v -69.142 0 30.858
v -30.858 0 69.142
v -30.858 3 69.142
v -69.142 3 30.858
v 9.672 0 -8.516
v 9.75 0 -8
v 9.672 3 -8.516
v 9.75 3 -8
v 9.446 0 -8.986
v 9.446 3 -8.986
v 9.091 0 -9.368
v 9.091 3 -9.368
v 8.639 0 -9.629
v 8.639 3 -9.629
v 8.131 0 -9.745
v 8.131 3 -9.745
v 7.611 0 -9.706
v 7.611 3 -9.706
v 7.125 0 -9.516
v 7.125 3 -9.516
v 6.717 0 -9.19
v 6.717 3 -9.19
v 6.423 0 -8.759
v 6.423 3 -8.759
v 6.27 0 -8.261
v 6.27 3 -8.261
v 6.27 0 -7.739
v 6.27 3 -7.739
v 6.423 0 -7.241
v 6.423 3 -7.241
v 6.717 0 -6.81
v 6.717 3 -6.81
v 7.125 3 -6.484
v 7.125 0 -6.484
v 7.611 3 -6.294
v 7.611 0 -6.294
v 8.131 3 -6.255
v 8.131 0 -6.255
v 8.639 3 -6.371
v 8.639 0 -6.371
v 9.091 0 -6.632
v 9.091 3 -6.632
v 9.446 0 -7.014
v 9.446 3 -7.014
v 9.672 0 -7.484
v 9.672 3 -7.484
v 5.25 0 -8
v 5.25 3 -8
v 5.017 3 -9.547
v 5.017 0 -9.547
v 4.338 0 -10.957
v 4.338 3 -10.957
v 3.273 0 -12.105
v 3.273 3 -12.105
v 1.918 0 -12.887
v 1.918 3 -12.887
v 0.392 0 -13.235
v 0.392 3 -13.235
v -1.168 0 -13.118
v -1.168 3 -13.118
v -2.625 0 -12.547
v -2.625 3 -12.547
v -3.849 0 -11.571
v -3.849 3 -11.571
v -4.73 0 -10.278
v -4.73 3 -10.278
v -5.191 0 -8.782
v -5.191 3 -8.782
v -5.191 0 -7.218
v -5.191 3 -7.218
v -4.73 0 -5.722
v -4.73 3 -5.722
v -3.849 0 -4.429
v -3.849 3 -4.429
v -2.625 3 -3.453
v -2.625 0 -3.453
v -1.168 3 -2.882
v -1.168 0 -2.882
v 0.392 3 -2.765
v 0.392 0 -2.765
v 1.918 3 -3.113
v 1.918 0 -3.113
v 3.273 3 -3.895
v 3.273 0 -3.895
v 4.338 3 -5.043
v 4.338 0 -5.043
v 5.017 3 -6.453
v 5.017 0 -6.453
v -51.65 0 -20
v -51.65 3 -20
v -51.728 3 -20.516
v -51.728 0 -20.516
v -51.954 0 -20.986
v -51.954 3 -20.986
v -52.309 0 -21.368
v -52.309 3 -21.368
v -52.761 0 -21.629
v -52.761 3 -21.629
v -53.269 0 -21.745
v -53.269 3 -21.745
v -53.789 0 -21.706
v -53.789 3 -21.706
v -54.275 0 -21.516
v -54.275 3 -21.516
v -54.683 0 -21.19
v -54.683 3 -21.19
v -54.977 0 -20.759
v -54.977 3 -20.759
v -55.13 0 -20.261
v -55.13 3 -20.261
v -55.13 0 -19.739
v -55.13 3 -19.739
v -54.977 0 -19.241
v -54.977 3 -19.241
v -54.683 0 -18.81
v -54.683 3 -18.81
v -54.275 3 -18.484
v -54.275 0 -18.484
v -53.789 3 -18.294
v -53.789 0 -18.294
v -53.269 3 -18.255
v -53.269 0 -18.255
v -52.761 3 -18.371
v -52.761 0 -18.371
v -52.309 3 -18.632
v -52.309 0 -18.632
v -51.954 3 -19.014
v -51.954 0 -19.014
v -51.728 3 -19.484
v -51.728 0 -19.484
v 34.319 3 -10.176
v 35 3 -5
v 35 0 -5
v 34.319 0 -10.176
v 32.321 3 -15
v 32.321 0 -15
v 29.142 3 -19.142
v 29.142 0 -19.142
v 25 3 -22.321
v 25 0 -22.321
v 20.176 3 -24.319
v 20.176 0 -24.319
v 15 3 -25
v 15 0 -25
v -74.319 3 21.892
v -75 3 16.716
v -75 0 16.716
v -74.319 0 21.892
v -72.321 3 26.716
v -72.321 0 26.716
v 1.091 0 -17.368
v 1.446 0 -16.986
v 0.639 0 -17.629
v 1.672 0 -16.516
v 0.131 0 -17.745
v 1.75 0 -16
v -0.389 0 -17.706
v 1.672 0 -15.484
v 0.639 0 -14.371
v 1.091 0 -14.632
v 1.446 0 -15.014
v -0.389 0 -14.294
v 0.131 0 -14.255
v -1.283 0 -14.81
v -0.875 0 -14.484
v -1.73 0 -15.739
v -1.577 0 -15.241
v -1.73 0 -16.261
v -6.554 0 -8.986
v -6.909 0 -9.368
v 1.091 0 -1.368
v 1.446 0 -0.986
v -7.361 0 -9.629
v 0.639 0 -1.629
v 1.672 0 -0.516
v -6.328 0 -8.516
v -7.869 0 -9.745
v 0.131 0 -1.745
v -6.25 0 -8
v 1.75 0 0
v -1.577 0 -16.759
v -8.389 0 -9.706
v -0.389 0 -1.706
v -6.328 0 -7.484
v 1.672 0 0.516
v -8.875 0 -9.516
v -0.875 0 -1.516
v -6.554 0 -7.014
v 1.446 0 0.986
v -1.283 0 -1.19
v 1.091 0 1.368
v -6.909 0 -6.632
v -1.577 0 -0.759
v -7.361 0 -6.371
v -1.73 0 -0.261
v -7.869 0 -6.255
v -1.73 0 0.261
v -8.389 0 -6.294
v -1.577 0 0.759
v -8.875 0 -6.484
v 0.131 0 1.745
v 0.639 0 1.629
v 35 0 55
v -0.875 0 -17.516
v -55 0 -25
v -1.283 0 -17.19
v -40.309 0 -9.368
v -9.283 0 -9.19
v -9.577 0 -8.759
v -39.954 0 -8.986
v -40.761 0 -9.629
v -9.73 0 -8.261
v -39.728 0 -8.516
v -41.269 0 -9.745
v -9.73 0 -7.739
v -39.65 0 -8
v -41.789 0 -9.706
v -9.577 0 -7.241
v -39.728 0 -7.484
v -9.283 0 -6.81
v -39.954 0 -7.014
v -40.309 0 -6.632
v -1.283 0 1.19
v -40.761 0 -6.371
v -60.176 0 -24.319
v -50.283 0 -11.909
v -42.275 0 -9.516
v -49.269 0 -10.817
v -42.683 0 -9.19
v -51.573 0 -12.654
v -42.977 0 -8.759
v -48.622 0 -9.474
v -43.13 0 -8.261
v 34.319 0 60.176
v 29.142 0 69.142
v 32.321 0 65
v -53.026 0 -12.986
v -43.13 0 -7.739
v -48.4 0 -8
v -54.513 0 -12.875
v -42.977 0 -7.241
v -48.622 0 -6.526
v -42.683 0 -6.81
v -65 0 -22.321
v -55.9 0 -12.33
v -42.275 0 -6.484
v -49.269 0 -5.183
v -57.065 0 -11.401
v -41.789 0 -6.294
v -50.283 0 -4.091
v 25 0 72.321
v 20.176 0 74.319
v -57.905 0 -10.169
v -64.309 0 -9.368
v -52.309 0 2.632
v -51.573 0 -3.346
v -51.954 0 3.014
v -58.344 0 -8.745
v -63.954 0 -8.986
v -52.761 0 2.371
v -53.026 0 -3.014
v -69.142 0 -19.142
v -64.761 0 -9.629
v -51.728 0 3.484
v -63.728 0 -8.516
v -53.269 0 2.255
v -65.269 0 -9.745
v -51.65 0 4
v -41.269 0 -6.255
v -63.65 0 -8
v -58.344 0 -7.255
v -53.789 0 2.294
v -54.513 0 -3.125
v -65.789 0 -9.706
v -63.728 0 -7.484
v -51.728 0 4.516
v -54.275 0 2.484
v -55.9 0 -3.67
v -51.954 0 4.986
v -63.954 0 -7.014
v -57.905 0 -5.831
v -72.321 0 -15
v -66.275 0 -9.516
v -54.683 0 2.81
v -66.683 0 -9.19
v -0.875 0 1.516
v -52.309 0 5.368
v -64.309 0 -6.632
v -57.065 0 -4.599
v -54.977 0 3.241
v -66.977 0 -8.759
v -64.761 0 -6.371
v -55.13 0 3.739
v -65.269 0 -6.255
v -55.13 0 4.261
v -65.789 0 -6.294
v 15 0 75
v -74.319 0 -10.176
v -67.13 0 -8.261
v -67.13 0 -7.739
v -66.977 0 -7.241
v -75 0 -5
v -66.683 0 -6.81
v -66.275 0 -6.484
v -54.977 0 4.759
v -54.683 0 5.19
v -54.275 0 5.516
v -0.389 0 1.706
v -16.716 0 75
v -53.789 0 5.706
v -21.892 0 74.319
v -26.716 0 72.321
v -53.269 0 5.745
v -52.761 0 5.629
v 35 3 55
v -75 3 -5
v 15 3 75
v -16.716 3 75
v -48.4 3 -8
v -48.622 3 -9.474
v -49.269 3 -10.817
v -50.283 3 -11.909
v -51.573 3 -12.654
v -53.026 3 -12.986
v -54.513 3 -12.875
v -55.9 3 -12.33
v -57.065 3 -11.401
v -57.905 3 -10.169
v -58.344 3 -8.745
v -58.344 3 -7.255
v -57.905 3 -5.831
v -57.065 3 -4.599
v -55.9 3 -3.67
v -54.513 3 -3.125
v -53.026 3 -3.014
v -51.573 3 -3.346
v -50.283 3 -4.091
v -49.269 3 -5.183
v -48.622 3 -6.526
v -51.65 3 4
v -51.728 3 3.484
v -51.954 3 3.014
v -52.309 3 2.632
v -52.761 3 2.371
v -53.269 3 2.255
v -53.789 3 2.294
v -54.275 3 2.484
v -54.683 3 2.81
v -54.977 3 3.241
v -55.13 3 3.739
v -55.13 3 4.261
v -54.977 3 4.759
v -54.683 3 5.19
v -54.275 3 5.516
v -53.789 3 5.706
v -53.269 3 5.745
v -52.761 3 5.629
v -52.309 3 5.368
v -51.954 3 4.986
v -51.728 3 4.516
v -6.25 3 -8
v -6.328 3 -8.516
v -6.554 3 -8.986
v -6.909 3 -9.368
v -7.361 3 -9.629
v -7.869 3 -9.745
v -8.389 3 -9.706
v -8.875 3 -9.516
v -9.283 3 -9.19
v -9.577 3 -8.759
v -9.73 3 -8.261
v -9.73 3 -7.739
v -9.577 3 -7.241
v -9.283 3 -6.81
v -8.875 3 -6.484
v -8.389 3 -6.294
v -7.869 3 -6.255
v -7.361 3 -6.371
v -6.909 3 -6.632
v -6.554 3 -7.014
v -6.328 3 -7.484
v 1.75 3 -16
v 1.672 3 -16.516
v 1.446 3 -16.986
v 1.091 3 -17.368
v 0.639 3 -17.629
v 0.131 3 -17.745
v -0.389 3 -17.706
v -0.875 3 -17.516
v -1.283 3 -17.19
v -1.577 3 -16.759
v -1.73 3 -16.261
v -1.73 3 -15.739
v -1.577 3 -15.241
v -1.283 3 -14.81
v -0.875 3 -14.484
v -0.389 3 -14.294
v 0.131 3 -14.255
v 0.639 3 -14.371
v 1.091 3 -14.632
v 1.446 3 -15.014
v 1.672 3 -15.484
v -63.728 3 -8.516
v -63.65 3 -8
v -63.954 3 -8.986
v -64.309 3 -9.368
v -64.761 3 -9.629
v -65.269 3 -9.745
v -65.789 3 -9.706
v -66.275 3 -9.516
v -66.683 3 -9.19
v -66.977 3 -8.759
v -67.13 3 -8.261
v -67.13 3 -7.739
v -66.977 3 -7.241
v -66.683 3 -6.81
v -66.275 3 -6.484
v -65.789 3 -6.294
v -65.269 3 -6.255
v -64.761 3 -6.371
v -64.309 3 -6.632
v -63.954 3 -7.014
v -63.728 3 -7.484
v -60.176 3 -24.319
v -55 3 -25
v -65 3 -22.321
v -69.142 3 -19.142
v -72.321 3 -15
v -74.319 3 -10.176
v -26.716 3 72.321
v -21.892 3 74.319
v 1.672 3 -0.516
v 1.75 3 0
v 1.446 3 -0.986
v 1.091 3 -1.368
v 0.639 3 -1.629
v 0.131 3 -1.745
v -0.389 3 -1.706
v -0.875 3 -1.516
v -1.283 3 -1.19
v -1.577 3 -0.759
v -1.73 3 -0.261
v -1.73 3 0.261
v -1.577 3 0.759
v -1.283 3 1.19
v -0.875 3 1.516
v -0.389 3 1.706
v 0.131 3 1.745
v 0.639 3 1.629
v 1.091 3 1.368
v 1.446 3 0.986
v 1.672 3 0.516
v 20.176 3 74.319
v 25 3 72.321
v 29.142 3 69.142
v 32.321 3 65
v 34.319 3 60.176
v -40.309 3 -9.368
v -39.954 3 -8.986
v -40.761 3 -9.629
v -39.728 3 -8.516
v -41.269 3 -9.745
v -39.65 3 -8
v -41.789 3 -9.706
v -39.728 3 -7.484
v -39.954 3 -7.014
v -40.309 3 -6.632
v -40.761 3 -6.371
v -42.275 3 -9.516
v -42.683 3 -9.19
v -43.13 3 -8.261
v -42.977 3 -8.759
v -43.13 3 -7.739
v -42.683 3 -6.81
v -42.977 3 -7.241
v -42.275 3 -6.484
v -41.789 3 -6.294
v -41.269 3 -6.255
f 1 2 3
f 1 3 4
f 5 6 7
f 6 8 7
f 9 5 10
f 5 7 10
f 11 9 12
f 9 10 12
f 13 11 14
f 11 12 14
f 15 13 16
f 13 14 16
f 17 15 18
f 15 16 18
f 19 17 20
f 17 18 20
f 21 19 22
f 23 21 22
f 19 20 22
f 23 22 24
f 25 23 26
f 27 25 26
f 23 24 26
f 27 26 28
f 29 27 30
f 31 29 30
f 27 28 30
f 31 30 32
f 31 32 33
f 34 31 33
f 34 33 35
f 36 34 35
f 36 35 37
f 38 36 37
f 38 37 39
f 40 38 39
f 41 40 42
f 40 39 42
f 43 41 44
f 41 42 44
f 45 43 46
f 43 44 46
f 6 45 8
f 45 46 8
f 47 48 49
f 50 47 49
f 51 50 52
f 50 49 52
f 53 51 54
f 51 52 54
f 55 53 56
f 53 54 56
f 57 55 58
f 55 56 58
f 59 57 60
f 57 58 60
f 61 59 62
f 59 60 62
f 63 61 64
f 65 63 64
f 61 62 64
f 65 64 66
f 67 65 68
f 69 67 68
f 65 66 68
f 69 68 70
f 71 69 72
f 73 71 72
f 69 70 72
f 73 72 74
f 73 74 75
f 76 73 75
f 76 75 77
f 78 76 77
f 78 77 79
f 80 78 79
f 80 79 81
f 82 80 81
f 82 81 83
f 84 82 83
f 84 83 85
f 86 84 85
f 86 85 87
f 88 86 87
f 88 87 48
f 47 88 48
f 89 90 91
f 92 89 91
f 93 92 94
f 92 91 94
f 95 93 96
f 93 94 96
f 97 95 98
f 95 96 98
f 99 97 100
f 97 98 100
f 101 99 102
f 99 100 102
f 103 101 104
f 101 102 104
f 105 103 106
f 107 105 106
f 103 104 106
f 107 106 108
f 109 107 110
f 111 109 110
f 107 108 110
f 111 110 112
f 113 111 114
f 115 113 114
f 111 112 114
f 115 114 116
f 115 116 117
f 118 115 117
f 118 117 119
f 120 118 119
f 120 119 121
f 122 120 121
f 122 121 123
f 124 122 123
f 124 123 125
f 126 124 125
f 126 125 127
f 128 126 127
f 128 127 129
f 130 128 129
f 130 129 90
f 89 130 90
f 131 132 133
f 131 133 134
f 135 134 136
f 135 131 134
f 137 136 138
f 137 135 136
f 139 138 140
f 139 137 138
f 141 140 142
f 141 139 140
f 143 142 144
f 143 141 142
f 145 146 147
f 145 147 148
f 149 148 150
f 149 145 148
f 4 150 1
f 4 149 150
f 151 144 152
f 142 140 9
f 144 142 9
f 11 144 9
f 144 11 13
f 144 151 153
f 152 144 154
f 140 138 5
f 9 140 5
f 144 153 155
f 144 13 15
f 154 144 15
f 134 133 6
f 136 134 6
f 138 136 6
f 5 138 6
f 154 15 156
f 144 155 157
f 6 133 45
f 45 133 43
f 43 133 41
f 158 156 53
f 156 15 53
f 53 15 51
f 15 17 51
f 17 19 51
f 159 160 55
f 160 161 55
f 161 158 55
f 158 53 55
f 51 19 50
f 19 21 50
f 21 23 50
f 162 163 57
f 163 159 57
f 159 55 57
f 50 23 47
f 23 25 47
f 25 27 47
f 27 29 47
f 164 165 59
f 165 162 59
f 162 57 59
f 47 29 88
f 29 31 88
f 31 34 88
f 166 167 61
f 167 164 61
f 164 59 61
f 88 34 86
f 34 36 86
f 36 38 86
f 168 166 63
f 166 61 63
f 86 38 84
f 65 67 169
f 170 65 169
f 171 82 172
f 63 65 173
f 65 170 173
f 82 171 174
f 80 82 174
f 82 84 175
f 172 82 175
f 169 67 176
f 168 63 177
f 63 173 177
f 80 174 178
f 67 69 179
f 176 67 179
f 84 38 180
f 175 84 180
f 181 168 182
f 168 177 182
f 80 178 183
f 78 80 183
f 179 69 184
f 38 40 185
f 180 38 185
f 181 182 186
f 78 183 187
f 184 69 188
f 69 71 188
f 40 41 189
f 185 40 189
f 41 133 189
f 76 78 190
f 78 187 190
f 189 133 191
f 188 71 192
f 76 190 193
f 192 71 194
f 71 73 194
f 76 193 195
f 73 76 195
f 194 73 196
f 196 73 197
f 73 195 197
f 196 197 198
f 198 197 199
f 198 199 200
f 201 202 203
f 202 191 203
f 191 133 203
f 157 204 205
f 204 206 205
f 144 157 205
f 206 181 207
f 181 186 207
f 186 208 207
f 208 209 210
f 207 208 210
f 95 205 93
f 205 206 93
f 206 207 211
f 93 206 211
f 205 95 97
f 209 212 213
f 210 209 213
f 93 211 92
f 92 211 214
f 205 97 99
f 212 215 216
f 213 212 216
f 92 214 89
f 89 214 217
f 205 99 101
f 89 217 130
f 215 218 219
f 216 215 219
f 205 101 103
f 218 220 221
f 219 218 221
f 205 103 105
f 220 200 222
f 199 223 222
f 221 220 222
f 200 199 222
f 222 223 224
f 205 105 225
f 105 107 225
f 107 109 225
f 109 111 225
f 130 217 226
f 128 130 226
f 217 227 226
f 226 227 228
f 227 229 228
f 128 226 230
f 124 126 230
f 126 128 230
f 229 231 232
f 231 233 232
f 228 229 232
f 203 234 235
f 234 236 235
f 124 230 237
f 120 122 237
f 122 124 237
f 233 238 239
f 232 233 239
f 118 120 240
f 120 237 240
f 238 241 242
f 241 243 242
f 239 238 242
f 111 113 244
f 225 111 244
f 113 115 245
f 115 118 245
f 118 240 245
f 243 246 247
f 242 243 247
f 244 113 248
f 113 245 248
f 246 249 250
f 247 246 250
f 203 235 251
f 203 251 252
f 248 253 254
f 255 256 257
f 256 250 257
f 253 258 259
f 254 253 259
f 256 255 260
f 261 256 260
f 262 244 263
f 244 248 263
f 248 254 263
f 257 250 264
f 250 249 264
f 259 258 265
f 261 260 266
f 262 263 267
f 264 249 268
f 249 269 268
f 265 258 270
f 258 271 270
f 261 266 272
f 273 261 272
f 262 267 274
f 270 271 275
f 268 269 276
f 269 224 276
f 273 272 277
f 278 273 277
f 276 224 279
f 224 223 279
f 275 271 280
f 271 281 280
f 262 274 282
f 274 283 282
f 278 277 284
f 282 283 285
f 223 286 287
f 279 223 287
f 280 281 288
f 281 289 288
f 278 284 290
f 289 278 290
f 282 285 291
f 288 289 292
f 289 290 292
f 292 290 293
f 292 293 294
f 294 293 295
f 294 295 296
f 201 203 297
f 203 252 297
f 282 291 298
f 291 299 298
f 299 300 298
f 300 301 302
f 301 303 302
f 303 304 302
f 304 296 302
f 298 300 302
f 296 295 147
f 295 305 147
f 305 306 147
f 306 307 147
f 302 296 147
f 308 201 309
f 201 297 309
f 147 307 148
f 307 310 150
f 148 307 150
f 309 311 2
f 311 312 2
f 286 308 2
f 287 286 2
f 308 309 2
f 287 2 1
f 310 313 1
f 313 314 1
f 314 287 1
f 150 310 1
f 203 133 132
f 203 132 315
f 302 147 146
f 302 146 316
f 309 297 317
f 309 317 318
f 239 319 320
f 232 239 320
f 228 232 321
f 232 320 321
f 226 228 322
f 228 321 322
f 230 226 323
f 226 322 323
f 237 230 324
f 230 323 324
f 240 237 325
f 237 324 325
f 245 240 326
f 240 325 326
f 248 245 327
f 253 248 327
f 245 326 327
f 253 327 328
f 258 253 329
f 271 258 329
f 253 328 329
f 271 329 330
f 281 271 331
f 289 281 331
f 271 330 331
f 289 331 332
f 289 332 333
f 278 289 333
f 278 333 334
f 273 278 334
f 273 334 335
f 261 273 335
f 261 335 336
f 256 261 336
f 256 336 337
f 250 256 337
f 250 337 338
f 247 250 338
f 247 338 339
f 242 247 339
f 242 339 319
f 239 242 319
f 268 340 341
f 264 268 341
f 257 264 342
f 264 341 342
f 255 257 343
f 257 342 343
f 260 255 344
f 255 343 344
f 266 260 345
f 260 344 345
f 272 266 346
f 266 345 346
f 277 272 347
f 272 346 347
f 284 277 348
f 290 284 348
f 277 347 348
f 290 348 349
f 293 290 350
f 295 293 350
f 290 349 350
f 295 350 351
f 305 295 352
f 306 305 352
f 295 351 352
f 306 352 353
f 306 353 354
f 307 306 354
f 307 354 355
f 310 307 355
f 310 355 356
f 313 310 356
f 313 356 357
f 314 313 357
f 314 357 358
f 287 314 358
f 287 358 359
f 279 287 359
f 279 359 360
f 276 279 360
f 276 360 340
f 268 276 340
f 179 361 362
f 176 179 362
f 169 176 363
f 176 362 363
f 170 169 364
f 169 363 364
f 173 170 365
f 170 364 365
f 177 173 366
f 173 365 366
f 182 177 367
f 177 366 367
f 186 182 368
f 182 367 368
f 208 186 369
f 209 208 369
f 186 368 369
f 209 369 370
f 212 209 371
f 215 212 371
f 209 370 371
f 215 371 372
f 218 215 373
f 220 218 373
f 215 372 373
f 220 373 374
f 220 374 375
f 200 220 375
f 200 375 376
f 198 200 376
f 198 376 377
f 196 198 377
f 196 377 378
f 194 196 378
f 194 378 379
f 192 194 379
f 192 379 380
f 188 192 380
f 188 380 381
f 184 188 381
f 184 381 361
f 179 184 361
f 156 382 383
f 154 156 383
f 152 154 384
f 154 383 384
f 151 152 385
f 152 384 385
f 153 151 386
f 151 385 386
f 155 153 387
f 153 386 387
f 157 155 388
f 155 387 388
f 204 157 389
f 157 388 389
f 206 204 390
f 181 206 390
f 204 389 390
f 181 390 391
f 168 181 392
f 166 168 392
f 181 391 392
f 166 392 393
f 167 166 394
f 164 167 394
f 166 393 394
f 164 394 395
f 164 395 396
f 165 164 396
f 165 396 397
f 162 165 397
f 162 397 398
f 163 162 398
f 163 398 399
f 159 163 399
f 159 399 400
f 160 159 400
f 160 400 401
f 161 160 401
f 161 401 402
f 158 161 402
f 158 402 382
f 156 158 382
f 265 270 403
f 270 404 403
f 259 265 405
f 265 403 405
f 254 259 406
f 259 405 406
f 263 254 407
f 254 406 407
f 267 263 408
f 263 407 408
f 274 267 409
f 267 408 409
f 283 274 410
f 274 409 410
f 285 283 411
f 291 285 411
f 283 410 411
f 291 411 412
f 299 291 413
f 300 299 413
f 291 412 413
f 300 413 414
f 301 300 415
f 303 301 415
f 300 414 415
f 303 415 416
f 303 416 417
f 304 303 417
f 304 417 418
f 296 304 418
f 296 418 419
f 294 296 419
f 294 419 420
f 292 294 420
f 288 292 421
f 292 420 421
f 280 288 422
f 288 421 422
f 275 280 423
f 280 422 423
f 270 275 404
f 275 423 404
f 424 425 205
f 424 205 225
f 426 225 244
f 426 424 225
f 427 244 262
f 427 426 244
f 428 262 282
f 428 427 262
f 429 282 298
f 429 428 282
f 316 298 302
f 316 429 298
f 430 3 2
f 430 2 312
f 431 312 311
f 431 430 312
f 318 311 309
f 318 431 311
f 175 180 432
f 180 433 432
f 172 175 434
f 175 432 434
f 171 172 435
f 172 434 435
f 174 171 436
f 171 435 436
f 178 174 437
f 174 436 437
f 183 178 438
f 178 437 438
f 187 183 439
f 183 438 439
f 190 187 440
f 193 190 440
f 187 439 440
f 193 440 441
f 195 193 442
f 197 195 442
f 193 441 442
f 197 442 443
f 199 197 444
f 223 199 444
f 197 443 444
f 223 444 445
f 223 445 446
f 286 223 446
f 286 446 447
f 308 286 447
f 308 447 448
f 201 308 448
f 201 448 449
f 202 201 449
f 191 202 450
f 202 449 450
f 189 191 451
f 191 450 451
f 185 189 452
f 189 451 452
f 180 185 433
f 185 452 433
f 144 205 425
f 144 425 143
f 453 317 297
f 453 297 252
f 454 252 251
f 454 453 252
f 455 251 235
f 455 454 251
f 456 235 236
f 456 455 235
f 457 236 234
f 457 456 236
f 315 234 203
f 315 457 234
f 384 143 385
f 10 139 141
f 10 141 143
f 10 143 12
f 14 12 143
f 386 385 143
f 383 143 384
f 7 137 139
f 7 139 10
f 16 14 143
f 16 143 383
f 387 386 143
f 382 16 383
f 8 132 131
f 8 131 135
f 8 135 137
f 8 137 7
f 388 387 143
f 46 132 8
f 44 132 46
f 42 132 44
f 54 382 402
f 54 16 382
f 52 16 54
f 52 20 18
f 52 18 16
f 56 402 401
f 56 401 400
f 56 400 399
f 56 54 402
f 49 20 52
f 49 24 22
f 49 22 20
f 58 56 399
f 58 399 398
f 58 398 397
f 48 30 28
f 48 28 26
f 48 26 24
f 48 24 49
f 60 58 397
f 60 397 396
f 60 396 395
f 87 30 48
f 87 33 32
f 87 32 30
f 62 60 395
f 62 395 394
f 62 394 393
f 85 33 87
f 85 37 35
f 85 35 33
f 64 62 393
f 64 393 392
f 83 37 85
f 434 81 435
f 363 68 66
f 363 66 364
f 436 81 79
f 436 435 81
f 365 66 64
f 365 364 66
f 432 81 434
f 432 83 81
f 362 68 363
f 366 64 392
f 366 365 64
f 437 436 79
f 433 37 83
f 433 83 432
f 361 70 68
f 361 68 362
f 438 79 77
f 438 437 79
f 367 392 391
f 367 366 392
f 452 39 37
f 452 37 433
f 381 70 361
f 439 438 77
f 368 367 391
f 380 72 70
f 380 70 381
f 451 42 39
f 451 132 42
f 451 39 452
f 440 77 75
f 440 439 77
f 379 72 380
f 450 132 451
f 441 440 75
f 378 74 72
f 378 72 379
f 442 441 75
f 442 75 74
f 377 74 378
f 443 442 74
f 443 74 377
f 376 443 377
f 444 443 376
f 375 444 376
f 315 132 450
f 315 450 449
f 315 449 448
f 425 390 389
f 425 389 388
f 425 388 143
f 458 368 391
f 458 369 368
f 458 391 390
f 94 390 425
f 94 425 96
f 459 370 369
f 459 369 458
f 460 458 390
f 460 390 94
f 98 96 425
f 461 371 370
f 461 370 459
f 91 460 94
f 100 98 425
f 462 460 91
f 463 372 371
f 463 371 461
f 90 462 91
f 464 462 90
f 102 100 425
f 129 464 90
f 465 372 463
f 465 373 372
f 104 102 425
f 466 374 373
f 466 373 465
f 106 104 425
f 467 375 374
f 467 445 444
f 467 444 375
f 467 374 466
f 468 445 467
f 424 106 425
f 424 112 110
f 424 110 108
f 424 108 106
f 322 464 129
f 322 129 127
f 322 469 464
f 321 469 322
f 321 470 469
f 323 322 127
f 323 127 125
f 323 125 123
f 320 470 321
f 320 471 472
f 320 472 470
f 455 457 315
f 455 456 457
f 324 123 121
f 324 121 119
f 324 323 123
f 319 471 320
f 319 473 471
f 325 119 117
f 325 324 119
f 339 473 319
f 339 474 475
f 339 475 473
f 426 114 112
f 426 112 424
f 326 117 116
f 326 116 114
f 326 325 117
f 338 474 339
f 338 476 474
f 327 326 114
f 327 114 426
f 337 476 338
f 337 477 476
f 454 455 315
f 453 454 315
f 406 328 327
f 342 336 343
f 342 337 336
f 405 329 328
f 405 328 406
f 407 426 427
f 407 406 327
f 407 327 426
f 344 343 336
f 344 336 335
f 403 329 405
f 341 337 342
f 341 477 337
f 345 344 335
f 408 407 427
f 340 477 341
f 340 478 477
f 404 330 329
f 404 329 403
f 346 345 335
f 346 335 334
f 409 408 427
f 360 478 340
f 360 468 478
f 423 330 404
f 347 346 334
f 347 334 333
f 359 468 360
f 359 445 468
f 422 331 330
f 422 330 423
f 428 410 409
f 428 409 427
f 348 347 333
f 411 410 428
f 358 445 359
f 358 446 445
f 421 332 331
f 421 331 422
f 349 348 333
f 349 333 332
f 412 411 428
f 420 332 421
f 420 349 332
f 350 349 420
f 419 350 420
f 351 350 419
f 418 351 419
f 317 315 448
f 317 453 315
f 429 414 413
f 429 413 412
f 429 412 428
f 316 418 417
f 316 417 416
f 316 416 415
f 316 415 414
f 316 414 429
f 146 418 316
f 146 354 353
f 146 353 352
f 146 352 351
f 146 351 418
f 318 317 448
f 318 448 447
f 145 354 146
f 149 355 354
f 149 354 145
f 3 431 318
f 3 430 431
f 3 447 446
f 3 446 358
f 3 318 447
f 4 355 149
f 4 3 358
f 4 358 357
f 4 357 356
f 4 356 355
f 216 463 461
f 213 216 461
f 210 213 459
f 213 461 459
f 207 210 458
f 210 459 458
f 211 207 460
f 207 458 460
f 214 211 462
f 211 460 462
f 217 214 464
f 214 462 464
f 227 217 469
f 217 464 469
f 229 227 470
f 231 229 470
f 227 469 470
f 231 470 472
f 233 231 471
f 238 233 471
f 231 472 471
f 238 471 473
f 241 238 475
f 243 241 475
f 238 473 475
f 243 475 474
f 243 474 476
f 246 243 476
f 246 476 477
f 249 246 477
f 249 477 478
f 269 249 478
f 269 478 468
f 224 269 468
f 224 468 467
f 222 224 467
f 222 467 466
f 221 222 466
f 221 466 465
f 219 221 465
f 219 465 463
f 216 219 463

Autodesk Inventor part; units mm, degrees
ref_plane "YZ Plane" through (0, 0, 0) normal (1, 0, 0) x (0, 1, 0)
ref_plane "XZ Plane" through (0, 0, 0) normal (0, 1, 0) x (-1, 0, 0)
ref_plane "XY Plane" through (0, 0, 0) normal (0, 0, 1) x (1, 0, 0)
sketch "Sketch1" plane through (0, 0, 0) normal (0, 1, 0) x (-1, 0, 0)
  line L0 (-75, 25) -> (75, 25)
  line L1 (75, 25) -> (75, -25)
  line L2 (75, -25) -> (-75, -25)
  line L3 (-75, -25) -> (-75, 25)
  line L4 (-75, 25) -> (75, -25) construction
  line L5 (75, 25) -> (-75, -25) construction
  line L6 (-75, -25) -> (-35, -25)
  line L7 (-35, -25) -> (-35, 25)
  line L8 (-35, 25) -> (-75, 25)
  line L9 (-75, 25) -> (-75, -25)
  line L10 (-35, 25) -> (-35, 75)
  line L11 (-35, 75) -> (75, 75)
  line L12 (75, 75) -> (75, 25)
  line L13 (-35, 75) -> (25, 75)
  line L14 (25, 75) -> (75, 25)
  point P0 (0, 0)
  point P1 (-35, -25)
  dimension "d0" = 150
  dimension "d1" = 50
  dimension "d57" = 40
  dimension "d58" = 50
  dimension "d59" = 50
  dimension "d60" = 60
extrude "Extrusion1" add sketch "Sketch1" along normal blind 3 contours L10 L11 L14 L0 | L0 L1 L2 L7
sketch "Sketch6" plane through (0, 3, 0) normal (0, 1, 0) x (1, 0, 0)
  line L0 (35, 25) -> (-75, 25) projected
  line L1 (0, 25) -> (0, 8)
  circle A0 centre (0, 8) radius 5.25
  line L2 (0, 8) -> (-53.4, 8)
  circle A1 centre (-53.4, 8) radius 5
  circle A2 centre (0, 8) radius 8
  circle A3 centre (0, 16) radius 1.75
  circle A4 centre (-8, 8) radius 1.75
  circle A5 centre (0, 0) radius 1.75
  circle A6 centre (8, 8) radius 1.75
  circle A7 centre (-53.4, 8) radius 12
  line L3 (-53.4, -4) -> (-53.4, 20)
  circle A8 centre (-53.4, 20) radius 1.75
  circle A9 centre (-65.4, 8) radius 1.75
  circle A10 centre (-53.4, -4) radius 1.75
  circle A11 centre (-41.4, 8) radius 1.75
  point P0 (0, 0)
  point P1 (75, 25)
  dimension "d49" = 24
  dimension "d40" = 17
  dimension "d41" = 10.5
  dimension "d42" = 53.4
  dimension "d43" = 10
  dimension "d44" = 3.5
  dimension "d47" = 360
  dimension "d50" = 3.5
  dimension "d53" = 360
extrude "Extrusion6" cut sketch "Sketch6" against normal through all contours A3 A2 L1 | A11 A7 L2 | L2 A7 A11 | L1 A2 A3 | A2 A3 L1 | L1 A3 A2 | A4 L2 A2 | A2 L2 A4 | A0 L2 L1 | L1 L2 A0 | A6 A2 | A2 A6 | A2 A4 L2 | L2 A4 A2 | A5 A2 | A2 A5 | A7 A11 L2 | L2 A11 A7 | A8 L3 A7 | A7 A8 | A10 A7 | A7 L3 A10 | A1 L3 L2 | L2 L3 A1 | L3 A8 A7 | A7 A10 L3 | L3 A1 | A9 A7 | A7 A9
fillet "Fillet1" radius 20 5 edges at (35, 1.5, -25) (35, 1.5, 75) (-25, 1.5, 75) (-75, 1.5, 25) (-75, 1.5, -25)
properties part number "TopMount"
